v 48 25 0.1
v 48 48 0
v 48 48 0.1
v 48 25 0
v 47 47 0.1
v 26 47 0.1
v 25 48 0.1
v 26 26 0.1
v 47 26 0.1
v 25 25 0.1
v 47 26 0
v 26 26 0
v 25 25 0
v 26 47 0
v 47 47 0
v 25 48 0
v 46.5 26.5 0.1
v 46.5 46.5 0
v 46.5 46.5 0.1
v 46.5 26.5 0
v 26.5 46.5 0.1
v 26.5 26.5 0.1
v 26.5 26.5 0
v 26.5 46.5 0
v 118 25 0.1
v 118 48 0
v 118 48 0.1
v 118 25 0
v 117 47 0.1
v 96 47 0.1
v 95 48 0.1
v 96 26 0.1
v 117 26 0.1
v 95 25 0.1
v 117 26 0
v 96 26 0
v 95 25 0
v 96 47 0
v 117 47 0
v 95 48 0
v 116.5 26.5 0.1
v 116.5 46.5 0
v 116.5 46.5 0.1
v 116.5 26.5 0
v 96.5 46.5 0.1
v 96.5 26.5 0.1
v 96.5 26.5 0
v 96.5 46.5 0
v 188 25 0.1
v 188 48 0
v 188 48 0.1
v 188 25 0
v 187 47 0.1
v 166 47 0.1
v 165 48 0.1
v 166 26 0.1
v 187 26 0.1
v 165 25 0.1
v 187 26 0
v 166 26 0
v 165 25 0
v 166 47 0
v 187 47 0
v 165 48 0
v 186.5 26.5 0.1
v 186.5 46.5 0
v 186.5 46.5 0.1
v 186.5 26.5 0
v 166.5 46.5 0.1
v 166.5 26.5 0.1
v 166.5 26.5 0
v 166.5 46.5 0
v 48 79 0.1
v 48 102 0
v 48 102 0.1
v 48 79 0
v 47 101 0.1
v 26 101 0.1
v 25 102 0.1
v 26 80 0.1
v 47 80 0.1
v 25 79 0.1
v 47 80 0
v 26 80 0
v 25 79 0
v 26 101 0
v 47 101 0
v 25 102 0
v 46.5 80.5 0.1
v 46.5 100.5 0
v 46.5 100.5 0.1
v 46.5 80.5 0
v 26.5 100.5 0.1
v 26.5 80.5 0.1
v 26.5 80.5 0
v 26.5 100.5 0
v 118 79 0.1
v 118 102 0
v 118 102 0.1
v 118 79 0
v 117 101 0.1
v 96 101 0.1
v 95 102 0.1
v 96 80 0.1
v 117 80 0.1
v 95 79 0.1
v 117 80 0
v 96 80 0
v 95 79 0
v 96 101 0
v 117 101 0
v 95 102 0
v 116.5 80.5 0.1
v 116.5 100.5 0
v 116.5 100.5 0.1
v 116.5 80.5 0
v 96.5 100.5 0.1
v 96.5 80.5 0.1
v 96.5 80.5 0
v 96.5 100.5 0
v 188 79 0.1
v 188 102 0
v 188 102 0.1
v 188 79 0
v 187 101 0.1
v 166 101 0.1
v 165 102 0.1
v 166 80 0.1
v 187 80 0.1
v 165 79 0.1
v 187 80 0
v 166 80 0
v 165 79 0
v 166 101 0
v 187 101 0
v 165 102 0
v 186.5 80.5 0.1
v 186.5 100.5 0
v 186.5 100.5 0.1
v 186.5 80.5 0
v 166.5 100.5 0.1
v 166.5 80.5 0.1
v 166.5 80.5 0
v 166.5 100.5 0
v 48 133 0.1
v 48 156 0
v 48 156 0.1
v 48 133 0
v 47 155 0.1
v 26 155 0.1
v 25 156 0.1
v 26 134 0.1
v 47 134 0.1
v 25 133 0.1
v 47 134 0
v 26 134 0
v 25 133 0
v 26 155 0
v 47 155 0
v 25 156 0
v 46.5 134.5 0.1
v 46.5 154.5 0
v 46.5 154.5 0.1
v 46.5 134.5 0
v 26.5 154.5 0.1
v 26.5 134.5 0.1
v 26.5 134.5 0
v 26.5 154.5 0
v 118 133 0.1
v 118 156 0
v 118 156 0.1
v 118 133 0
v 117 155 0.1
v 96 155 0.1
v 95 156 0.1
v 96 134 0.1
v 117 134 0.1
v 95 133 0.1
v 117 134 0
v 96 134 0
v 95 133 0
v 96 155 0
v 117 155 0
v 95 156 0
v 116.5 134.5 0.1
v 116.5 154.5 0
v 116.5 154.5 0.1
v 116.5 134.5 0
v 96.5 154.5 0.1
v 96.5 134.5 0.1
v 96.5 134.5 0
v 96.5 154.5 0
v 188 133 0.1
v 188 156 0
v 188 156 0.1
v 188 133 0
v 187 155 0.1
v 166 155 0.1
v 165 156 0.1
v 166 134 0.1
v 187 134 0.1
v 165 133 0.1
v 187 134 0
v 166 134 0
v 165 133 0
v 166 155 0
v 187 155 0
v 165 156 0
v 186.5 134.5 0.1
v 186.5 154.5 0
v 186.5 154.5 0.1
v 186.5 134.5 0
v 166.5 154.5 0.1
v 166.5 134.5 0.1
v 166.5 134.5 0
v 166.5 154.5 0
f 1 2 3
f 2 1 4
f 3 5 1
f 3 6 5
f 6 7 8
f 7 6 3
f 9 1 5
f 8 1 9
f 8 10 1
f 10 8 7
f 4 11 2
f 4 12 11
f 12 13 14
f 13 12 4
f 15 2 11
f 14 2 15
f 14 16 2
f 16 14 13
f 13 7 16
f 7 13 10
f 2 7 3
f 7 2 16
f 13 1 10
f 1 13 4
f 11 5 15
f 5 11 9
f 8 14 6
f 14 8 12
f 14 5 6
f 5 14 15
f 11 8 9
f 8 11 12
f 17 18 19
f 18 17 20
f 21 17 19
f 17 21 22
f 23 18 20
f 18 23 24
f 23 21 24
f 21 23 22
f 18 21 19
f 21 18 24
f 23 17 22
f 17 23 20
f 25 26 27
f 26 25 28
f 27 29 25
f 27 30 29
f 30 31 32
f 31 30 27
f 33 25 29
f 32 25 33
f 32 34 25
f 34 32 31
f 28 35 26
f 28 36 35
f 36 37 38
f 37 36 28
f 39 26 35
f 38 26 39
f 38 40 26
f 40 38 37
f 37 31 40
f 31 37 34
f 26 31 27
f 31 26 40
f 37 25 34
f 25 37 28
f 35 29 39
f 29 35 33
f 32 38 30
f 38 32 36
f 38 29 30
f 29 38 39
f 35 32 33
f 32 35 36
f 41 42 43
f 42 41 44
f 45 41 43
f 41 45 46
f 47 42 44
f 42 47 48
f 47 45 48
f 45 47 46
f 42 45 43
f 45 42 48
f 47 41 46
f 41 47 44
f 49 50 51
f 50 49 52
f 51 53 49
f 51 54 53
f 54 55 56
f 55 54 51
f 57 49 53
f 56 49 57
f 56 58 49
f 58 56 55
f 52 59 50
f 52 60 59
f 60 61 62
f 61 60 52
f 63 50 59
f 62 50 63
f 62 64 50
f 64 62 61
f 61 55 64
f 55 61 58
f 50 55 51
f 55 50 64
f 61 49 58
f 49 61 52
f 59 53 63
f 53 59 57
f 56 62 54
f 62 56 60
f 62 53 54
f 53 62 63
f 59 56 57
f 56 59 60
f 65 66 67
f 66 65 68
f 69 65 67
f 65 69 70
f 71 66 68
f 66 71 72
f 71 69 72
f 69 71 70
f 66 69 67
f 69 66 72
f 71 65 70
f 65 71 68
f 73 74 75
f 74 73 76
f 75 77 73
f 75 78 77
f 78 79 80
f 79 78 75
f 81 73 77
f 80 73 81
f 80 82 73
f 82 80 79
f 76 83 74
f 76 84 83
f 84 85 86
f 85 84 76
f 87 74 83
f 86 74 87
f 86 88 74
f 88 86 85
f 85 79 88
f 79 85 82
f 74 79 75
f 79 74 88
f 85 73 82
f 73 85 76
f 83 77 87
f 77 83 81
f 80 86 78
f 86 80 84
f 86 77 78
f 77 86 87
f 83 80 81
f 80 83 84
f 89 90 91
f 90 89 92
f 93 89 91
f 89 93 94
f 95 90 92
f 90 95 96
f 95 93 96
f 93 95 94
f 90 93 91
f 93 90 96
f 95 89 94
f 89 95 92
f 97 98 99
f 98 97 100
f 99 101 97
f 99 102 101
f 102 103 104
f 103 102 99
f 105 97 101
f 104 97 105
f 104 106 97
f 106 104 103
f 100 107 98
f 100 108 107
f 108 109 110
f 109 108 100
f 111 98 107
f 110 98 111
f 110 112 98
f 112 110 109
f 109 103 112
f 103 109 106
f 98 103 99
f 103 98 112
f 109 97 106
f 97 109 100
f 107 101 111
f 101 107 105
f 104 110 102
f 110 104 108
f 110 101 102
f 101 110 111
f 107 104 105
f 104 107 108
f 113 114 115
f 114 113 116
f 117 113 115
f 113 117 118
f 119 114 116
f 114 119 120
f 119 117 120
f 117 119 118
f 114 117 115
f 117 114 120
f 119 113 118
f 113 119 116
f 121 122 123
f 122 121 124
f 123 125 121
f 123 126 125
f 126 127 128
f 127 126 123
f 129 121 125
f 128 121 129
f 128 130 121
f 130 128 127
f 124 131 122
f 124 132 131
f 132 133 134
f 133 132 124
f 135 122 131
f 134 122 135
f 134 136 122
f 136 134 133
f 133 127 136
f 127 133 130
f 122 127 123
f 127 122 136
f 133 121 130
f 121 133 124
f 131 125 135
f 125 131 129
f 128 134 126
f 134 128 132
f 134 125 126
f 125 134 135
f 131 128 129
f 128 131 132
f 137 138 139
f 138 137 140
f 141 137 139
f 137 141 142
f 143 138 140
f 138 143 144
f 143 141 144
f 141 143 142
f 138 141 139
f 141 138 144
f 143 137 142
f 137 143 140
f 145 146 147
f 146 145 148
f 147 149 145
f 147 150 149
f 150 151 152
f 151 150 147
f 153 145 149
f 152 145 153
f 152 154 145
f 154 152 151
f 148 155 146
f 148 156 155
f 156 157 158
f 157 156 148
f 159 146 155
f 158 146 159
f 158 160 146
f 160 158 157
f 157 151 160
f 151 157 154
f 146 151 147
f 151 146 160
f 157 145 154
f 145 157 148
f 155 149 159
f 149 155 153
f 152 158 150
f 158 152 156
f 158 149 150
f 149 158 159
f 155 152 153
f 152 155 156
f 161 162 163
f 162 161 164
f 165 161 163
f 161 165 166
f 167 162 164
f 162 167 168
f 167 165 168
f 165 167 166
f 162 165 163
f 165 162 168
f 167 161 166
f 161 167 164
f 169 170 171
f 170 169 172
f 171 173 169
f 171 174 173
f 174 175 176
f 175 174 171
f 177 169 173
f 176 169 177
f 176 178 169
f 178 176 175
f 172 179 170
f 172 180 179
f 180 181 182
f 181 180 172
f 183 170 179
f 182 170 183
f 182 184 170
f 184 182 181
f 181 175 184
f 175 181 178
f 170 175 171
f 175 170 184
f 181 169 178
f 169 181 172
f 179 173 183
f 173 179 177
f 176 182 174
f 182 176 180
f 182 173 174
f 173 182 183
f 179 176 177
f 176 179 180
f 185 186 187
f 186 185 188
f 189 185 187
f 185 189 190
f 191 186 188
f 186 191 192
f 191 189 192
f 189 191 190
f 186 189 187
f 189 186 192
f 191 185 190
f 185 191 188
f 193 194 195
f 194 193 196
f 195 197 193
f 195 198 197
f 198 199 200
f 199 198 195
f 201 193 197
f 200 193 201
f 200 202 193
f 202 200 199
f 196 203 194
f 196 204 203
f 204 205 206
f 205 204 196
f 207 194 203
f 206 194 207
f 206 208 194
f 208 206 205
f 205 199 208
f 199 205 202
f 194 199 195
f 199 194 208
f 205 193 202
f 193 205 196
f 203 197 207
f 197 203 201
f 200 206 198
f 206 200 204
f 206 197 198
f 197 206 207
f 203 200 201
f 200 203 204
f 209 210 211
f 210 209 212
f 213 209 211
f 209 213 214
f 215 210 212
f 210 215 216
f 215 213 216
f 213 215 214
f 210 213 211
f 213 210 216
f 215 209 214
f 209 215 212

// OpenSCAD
/**
 * Print designed to check that you bed is level
 *
 * print four small squares in each corner to ensure even print quality and good adhesion.
 */

// Define your printers printable area
// If you are using Sprinter firmware then these come directly from configuration.h

X_MAX_LENGTH = 210;
Y_MAX_LENGTH = 178;

THICKNESS = 0.1; //Square / outline thickness
SIZE = 20; //Square width / height
GAP = 0.5; //Width of border between square and parameter
OUTLINE_WIDTH = 1; //Width of parameter around square
OFFSET = 25; //Offset from limits in each axis

translate([OFFSET, OFFSET, 0]) square(); //Top Left
translate([(X_MAX_LENGTH / 2) - (SIZE / 2), OFFSET, 0]) square(); //Top Middle
translate([X_MAX_LENGTH - OFFSET - SIZE, OFFSET, 0]) square(); //Top Right

translate([OFFSET, (Y_MAX_LENGTH / 2) - (SIZE / 2), 0]) square(); //Middle Left
translate([(X_MAX_LENGTH / 2) - (SIZE / 2), (Y_MAX_LENGTH / 2) - (SIZE / 2), 0]) square(); //Middle Middle
translate([X_MAX_LENGTH - OFFSET - SIZE, (Y_MAX_LENGTH / 2) - (SIZE / 2), 0]) square(); //Middle Right

translate([OFFSET, Y_MAX_LENGTH - OFFSET - SIZE, 0]) square(); //Bottom Left
translate([(X_MAX_LENGTH / 2) - (SIZE / 2), Y_MAX_LENGTH - OFFSET - SIZE, 0]) square(); //Bottom Middle
translate([X_MAX_LENGTH - OFFSET - SIZE, Y_MAX_LENGTH - OFFSET - SIZE, 0]) square(); //Bottom Right

module square() {
	//Center square
	translate([
				OUTLINE_WIDTH + GAP,
				OUTLINE_WIDTH + GAP,
				0
			])
		cube([SIZE, SIZE, THICKNESS]);

	//Parameter
	difference() {
		//Outer square
		cube([
				SIZE + (2 * (GAP + OUTLINE_WIDTH)),
				SIZE + (2 * (GAP + OUTLINE_WIDTH)),
				THICKNESS
			]);

		//Inner square
		translate([OUTLINE_WIDTH, OUTLINE_WIDTH, -5])
			cube([SIZE + (2 * GAP), SIZE + (2 * GAP), 10]);
	}
}
